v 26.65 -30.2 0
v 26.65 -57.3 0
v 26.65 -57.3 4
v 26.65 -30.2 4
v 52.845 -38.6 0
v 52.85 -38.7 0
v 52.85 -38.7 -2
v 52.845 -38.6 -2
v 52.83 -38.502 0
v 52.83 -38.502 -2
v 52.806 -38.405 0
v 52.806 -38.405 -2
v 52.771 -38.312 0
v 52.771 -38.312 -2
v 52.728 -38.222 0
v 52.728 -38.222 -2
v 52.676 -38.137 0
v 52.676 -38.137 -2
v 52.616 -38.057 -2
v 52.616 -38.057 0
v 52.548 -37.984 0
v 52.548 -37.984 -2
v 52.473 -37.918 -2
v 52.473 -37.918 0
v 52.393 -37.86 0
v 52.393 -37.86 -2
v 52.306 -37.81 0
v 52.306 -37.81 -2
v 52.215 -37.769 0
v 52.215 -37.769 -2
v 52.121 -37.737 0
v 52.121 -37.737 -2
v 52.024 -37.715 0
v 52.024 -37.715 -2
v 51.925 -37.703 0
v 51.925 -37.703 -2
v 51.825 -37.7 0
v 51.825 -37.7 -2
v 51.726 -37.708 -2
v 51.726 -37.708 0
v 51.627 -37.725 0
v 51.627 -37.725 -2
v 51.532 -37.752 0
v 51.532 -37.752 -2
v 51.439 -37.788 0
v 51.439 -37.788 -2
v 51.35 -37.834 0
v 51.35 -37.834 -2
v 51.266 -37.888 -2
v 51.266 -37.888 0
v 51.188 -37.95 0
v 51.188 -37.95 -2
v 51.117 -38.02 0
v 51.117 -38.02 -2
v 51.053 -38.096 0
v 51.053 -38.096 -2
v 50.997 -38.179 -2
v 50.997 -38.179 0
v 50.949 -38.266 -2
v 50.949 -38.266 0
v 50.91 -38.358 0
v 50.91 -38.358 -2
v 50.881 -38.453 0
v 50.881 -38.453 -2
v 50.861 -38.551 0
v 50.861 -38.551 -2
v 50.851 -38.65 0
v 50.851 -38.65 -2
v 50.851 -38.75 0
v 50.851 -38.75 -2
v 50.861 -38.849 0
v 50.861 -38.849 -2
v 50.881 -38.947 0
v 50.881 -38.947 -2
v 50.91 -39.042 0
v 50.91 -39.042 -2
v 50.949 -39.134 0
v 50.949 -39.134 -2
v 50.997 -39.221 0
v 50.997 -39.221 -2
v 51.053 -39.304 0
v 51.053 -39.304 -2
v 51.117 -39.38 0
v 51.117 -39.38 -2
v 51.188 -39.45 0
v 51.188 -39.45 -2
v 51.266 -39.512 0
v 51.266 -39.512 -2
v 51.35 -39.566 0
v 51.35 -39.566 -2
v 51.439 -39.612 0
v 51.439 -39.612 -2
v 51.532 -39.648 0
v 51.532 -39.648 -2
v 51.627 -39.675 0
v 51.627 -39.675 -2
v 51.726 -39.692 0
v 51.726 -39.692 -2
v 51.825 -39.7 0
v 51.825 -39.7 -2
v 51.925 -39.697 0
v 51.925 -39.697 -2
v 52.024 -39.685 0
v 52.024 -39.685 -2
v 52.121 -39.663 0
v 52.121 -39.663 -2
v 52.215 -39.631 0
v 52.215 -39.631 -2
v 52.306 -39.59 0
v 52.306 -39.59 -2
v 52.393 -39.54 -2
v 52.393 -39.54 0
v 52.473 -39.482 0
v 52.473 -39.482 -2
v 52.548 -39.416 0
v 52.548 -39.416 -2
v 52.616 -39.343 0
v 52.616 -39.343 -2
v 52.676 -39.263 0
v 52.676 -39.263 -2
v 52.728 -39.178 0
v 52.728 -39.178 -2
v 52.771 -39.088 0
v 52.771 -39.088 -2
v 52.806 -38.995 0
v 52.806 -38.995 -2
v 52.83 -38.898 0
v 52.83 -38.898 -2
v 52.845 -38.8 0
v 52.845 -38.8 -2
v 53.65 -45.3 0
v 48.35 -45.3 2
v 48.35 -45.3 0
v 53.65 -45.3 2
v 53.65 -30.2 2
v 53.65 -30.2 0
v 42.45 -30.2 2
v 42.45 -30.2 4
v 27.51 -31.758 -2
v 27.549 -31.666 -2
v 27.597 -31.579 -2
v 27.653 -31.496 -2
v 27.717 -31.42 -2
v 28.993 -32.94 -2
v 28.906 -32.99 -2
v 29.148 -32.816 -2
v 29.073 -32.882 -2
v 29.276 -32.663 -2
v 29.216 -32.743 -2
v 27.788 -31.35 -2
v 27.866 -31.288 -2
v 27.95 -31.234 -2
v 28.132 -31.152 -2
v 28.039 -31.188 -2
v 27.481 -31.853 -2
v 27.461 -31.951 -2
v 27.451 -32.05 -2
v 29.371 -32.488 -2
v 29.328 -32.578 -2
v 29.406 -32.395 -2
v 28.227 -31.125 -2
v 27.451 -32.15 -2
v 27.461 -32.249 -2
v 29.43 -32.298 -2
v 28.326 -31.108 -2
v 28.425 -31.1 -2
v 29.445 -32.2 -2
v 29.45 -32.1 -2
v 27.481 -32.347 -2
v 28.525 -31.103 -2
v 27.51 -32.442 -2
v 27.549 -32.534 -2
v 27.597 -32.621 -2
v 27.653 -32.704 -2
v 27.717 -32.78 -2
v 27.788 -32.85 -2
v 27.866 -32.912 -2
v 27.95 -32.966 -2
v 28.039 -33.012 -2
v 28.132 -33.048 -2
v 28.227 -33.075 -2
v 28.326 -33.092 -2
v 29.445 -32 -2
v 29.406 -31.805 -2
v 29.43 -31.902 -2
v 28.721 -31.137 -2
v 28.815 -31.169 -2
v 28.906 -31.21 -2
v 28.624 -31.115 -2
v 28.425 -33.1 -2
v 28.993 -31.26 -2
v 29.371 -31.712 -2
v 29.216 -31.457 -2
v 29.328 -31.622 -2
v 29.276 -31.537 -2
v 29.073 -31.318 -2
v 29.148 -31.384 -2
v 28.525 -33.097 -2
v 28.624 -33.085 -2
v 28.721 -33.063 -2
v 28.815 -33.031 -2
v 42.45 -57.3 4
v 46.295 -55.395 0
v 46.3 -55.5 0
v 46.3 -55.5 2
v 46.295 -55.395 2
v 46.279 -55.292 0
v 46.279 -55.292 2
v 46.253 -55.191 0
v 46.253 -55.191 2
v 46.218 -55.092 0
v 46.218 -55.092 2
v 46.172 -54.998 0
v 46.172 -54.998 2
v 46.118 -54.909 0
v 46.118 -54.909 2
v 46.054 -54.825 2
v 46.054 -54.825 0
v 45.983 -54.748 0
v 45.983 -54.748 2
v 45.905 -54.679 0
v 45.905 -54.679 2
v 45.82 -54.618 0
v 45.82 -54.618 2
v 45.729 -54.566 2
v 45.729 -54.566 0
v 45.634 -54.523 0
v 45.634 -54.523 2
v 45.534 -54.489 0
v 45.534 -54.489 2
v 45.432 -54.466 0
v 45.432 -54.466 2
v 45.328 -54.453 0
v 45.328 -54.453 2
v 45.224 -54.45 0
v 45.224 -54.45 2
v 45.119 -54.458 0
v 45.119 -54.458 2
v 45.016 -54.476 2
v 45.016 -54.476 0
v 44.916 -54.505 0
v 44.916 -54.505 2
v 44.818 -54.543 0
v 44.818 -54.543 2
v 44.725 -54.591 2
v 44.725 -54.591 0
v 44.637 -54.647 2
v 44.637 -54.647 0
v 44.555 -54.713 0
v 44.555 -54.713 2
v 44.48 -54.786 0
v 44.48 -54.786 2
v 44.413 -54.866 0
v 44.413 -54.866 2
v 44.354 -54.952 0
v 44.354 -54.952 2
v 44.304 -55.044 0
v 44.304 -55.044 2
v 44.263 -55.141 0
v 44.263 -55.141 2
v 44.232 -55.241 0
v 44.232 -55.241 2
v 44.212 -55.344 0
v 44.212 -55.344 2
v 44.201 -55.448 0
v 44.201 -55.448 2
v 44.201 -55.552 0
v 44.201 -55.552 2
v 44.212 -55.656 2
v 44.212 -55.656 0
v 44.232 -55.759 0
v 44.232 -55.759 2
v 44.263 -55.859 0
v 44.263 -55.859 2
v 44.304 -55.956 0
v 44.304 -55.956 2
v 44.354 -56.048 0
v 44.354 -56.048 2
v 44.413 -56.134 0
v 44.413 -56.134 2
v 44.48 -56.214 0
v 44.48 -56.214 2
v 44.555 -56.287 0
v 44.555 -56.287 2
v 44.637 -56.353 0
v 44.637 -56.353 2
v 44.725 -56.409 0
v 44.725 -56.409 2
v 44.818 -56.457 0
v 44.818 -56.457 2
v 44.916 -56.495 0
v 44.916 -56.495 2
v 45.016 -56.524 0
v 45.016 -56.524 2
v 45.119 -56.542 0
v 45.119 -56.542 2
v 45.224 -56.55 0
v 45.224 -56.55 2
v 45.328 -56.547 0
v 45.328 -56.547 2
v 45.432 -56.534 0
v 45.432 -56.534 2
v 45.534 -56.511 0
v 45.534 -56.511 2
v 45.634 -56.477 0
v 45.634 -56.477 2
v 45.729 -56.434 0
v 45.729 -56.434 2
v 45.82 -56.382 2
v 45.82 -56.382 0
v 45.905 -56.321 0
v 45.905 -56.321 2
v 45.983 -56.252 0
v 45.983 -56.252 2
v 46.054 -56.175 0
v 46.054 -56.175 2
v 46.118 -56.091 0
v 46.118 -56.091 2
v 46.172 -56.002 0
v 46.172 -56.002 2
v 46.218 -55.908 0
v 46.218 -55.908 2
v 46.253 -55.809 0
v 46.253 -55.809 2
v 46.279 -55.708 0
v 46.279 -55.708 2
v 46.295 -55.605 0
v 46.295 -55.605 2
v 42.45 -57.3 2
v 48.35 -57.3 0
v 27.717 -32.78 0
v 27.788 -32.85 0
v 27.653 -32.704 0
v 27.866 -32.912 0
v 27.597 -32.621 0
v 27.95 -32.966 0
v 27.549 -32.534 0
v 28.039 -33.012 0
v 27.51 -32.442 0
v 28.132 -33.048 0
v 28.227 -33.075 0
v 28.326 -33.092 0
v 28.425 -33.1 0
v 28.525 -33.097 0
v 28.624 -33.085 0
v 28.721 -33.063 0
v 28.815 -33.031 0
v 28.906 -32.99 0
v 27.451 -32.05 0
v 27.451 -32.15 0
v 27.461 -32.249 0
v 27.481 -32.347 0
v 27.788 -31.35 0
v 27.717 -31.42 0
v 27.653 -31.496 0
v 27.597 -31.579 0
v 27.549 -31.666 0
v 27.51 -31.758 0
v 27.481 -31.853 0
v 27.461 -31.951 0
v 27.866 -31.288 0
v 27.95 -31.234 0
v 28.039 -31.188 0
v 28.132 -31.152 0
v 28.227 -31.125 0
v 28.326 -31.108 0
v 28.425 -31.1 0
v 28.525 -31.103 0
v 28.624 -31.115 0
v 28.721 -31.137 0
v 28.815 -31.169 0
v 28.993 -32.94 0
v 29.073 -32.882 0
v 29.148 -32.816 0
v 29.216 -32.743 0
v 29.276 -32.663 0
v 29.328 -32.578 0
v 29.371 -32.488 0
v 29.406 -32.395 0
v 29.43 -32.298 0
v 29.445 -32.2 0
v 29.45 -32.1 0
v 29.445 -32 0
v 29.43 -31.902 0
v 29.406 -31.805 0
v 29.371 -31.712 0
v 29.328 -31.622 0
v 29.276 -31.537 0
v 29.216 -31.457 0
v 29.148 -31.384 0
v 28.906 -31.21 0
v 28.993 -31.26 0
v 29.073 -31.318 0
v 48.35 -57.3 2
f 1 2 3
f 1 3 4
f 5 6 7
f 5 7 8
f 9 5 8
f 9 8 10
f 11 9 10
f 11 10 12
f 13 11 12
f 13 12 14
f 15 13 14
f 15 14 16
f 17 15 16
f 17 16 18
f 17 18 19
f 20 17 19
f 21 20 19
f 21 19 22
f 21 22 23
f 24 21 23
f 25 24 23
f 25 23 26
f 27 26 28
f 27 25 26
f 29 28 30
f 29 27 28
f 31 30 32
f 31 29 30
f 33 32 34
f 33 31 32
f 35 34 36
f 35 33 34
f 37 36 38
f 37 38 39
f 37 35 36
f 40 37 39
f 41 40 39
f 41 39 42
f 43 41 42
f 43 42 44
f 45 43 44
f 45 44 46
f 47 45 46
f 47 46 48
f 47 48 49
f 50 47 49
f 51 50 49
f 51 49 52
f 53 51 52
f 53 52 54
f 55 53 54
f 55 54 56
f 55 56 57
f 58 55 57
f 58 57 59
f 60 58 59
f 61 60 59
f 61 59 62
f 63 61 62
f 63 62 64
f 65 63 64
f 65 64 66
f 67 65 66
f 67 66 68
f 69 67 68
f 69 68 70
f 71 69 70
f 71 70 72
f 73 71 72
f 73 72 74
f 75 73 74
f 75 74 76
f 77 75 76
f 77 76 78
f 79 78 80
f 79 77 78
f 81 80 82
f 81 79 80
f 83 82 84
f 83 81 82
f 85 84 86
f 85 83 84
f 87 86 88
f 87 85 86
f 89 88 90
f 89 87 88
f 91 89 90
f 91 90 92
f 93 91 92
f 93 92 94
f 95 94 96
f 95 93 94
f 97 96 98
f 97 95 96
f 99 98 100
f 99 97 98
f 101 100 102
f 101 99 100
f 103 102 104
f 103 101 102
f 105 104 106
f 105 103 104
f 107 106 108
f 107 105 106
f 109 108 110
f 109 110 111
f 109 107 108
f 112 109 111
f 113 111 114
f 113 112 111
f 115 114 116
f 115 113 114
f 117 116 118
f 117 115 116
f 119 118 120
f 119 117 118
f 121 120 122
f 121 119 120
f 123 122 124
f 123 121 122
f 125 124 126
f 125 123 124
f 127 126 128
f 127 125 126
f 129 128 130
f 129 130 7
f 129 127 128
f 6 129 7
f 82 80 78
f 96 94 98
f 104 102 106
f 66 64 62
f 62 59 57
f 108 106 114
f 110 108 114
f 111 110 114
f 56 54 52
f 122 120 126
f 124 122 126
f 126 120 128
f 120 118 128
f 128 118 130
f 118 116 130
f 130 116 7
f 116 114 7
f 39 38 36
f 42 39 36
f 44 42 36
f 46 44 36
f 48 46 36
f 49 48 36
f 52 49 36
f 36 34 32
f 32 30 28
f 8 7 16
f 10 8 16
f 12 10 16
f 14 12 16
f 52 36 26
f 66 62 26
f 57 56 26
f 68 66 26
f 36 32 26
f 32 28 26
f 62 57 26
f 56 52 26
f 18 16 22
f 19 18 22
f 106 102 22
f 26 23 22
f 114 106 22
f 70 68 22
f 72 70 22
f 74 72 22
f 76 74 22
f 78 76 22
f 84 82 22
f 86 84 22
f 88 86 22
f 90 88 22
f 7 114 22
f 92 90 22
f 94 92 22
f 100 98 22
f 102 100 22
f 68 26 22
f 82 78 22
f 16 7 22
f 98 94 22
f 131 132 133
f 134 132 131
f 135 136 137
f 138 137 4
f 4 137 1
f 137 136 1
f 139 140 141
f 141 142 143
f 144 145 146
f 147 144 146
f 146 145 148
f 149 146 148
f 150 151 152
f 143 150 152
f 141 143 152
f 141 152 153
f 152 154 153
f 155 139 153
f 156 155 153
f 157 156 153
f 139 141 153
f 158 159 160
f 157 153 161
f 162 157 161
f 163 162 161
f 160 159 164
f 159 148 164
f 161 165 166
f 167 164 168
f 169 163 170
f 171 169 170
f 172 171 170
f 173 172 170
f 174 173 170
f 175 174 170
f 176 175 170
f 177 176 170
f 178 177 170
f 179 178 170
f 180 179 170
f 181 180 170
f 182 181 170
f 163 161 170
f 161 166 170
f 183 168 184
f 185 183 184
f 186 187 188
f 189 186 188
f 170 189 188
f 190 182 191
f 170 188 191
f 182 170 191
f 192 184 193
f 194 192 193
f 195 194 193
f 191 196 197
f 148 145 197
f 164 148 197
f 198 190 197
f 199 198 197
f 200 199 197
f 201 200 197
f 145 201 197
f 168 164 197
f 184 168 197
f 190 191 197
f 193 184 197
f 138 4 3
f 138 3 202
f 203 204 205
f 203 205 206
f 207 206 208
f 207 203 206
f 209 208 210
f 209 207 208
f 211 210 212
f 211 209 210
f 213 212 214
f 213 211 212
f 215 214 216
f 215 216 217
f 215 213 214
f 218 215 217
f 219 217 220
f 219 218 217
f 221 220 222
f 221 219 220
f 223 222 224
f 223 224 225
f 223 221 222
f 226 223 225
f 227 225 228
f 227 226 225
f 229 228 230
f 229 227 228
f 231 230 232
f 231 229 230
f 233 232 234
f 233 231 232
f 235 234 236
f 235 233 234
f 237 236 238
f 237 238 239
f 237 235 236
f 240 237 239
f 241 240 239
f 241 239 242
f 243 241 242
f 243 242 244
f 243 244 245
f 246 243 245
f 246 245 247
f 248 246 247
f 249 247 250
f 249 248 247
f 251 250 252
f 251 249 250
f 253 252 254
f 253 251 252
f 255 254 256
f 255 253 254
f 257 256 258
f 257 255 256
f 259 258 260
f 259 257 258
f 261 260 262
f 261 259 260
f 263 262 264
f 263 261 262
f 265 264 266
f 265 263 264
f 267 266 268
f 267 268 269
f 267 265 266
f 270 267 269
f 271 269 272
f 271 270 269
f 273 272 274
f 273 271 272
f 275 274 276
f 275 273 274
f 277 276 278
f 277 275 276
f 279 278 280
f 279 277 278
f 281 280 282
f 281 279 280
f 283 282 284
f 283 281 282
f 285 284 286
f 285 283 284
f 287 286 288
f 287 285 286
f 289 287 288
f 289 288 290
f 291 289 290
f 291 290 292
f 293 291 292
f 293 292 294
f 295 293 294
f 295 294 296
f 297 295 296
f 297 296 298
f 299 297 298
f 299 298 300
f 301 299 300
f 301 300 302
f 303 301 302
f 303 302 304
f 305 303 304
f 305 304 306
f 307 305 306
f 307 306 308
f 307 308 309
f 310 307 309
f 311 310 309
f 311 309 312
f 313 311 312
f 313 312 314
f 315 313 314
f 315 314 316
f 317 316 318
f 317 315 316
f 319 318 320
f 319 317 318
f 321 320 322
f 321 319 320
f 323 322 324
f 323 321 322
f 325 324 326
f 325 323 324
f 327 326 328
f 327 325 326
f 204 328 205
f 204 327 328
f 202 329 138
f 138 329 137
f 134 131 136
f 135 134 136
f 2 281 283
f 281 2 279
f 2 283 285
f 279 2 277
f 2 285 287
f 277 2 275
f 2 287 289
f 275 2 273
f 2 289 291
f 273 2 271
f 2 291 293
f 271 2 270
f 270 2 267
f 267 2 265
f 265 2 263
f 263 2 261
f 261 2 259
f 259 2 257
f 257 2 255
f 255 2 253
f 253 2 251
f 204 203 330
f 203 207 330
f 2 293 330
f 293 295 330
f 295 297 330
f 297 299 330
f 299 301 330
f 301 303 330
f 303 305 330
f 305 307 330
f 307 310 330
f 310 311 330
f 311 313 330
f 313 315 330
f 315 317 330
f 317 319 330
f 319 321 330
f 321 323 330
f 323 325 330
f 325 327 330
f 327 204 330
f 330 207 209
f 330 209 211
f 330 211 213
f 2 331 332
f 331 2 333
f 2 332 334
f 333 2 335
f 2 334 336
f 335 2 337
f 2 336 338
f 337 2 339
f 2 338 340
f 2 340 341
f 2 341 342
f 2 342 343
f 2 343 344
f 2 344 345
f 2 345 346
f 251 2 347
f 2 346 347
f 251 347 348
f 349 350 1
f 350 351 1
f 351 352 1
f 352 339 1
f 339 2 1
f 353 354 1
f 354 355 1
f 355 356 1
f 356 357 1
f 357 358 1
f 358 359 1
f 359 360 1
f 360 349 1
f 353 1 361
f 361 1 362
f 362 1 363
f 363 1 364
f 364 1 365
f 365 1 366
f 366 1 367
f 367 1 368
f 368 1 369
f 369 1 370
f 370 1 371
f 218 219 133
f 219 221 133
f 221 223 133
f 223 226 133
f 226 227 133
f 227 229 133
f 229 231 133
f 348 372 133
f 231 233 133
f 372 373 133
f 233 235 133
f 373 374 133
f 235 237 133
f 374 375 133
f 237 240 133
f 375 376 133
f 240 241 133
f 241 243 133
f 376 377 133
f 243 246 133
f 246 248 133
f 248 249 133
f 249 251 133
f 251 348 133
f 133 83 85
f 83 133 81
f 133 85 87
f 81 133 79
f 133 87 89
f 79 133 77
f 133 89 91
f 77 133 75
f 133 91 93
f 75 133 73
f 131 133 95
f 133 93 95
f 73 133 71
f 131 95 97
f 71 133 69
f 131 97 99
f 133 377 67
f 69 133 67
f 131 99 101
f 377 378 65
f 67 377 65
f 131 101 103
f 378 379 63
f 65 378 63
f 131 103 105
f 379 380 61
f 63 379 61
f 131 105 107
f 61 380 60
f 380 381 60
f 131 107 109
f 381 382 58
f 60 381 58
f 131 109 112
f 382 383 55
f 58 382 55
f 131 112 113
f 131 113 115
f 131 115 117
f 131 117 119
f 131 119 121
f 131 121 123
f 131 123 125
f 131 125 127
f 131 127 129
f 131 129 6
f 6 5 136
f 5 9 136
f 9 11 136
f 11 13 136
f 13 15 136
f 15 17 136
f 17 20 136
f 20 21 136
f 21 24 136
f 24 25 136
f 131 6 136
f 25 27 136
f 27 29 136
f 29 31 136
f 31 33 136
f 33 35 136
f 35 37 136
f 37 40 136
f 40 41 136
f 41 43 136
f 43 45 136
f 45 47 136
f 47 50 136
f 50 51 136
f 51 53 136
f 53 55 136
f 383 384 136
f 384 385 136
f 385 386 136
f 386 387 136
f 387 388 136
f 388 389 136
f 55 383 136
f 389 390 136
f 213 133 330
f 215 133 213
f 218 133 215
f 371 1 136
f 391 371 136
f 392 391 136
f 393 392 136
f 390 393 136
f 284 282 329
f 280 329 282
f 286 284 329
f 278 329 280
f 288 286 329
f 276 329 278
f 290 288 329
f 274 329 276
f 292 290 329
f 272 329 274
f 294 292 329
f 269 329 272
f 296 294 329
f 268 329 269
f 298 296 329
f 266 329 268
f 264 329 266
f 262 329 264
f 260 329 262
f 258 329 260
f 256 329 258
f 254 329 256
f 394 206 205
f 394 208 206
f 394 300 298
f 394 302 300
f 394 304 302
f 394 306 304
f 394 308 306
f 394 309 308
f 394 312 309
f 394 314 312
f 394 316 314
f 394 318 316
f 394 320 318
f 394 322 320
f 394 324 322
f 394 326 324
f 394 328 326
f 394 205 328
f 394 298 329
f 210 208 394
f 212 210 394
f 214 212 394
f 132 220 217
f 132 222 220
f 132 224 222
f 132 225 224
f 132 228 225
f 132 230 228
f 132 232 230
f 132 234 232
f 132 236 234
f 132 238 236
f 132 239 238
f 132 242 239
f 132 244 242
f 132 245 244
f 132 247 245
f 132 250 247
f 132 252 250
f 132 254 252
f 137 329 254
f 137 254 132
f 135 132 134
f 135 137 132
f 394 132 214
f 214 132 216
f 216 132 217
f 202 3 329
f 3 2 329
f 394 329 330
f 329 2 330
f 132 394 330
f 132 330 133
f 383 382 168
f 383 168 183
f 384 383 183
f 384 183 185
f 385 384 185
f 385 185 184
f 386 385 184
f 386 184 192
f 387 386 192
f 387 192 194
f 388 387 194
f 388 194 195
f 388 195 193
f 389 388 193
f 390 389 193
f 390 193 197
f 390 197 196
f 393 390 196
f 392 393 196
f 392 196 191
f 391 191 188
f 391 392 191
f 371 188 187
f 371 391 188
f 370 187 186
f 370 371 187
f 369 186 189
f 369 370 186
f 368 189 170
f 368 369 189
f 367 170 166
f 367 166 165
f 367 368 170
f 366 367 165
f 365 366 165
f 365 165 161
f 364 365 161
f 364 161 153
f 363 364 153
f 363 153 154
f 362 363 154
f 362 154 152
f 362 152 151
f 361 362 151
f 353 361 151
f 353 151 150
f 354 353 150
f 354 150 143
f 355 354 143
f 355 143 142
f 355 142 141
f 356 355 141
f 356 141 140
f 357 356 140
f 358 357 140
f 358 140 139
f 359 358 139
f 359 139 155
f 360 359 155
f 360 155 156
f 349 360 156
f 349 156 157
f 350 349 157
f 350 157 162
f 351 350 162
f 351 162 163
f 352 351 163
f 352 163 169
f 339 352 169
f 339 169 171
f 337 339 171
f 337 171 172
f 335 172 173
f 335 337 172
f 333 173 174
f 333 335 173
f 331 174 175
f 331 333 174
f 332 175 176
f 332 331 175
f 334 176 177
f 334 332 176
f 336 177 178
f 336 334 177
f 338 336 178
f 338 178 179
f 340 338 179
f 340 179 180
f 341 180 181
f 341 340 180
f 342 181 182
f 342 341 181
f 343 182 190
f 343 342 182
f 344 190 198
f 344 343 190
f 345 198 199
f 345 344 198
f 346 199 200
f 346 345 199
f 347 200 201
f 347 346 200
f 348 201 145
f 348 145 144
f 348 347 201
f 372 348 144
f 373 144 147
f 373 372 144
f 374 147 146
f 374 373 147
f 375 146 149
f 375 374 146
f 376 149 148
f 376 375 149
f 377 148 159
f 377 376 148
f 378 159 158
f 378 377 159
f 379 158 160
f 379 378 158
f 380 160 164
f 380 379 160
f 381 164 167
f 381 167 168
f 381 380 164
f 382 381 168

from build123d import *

# Parameters (mm, degrees)
SKETCH1_W           = 27
SKETCH1_H           = 27.3
SKETCH1_R           = 1.05
BOSS_EXTRUDE1_DEPTH = 2
SKETCH2_W           = 5.3
SKETCH2_H           = 12
CUT_EXTRUDE1_DEPTH  = 79.521414277
SKETCH3_R           = 1
BOSS_EXTRUDE2_DEPTH = 4
SKETCH4_W           = 15.8
SKETCH4_H           = 27.3
BOSS_EXTRUDE3_DEPTH = 2
SKETCH5_W           = 27
SKETCH5_H           = 0.2
CUT_EXTRUDE2_DEPTH  = 79.597789409


with BuildPart() as part:
    # Sketch1 → Boss-Extrude1 (new body)
    with BuildSketch(Plane.XY):
        with Locations((40.15, -43.65)):
            Rectangle(SKETCH1_W, SKETCH1_H)
        with Locations((45.25, -55.5)):
            Circle(SKETCH1_R, mode=Mode.SUBTRACT)
    extrude(amount=BOSS_EXTRUDE1_DEPTH)

    # Sketch2 → Cut-Extrude1 (cut, through all)
    with BuildSketch(Plane.XY.offset(2)):
        with Locations((51, -51.3)):
            Rectangle(SKETCH2_W, SKETCH2_H)
    extrude(amount=-CUT_EXTRUDE1_DEPTH, mode=Mode.SUBTRACT)

    # Sketch3 → Boss-Extrude2 (add)
    with BuildSketch(Plane.XY.offset(2)):
        with Locations((28.45, -32.1)):
            Circle(SKETCH3_R)
        with Locations((51.85, -38.7)):
            Circle(SKETCH3_R)
    extrude(amount=-BOSS_EXTRUDE2_DEPTH)

    # Sketch4 → Boss-Extrude3 (add)
    with BuildSketch(Plane.XY.offset(2)):
        with Locations((34.55, -43.65)):
            Rectangle(SKETCH4_W, SKETCH4_H)
    extrude(amount=BOSS_EXTRUDE3_DEPTH)

    # Sketch5 → Cut-Extrude2 (cut, through all)
    with BuildSketch(Plane(origin=(0, 0, 0), x_dir=(-1, 0, 0), z_dir=(0, 0, -1))):
        with Locations((-40.15, -30.1)):
            Rectangle(SKETCH5_W, SKETCH5_H)
    extrude(amount=-CUT_EXTRUDE2_DEPTH, mode=Mode.SUBTRACT)


solid = part.part
